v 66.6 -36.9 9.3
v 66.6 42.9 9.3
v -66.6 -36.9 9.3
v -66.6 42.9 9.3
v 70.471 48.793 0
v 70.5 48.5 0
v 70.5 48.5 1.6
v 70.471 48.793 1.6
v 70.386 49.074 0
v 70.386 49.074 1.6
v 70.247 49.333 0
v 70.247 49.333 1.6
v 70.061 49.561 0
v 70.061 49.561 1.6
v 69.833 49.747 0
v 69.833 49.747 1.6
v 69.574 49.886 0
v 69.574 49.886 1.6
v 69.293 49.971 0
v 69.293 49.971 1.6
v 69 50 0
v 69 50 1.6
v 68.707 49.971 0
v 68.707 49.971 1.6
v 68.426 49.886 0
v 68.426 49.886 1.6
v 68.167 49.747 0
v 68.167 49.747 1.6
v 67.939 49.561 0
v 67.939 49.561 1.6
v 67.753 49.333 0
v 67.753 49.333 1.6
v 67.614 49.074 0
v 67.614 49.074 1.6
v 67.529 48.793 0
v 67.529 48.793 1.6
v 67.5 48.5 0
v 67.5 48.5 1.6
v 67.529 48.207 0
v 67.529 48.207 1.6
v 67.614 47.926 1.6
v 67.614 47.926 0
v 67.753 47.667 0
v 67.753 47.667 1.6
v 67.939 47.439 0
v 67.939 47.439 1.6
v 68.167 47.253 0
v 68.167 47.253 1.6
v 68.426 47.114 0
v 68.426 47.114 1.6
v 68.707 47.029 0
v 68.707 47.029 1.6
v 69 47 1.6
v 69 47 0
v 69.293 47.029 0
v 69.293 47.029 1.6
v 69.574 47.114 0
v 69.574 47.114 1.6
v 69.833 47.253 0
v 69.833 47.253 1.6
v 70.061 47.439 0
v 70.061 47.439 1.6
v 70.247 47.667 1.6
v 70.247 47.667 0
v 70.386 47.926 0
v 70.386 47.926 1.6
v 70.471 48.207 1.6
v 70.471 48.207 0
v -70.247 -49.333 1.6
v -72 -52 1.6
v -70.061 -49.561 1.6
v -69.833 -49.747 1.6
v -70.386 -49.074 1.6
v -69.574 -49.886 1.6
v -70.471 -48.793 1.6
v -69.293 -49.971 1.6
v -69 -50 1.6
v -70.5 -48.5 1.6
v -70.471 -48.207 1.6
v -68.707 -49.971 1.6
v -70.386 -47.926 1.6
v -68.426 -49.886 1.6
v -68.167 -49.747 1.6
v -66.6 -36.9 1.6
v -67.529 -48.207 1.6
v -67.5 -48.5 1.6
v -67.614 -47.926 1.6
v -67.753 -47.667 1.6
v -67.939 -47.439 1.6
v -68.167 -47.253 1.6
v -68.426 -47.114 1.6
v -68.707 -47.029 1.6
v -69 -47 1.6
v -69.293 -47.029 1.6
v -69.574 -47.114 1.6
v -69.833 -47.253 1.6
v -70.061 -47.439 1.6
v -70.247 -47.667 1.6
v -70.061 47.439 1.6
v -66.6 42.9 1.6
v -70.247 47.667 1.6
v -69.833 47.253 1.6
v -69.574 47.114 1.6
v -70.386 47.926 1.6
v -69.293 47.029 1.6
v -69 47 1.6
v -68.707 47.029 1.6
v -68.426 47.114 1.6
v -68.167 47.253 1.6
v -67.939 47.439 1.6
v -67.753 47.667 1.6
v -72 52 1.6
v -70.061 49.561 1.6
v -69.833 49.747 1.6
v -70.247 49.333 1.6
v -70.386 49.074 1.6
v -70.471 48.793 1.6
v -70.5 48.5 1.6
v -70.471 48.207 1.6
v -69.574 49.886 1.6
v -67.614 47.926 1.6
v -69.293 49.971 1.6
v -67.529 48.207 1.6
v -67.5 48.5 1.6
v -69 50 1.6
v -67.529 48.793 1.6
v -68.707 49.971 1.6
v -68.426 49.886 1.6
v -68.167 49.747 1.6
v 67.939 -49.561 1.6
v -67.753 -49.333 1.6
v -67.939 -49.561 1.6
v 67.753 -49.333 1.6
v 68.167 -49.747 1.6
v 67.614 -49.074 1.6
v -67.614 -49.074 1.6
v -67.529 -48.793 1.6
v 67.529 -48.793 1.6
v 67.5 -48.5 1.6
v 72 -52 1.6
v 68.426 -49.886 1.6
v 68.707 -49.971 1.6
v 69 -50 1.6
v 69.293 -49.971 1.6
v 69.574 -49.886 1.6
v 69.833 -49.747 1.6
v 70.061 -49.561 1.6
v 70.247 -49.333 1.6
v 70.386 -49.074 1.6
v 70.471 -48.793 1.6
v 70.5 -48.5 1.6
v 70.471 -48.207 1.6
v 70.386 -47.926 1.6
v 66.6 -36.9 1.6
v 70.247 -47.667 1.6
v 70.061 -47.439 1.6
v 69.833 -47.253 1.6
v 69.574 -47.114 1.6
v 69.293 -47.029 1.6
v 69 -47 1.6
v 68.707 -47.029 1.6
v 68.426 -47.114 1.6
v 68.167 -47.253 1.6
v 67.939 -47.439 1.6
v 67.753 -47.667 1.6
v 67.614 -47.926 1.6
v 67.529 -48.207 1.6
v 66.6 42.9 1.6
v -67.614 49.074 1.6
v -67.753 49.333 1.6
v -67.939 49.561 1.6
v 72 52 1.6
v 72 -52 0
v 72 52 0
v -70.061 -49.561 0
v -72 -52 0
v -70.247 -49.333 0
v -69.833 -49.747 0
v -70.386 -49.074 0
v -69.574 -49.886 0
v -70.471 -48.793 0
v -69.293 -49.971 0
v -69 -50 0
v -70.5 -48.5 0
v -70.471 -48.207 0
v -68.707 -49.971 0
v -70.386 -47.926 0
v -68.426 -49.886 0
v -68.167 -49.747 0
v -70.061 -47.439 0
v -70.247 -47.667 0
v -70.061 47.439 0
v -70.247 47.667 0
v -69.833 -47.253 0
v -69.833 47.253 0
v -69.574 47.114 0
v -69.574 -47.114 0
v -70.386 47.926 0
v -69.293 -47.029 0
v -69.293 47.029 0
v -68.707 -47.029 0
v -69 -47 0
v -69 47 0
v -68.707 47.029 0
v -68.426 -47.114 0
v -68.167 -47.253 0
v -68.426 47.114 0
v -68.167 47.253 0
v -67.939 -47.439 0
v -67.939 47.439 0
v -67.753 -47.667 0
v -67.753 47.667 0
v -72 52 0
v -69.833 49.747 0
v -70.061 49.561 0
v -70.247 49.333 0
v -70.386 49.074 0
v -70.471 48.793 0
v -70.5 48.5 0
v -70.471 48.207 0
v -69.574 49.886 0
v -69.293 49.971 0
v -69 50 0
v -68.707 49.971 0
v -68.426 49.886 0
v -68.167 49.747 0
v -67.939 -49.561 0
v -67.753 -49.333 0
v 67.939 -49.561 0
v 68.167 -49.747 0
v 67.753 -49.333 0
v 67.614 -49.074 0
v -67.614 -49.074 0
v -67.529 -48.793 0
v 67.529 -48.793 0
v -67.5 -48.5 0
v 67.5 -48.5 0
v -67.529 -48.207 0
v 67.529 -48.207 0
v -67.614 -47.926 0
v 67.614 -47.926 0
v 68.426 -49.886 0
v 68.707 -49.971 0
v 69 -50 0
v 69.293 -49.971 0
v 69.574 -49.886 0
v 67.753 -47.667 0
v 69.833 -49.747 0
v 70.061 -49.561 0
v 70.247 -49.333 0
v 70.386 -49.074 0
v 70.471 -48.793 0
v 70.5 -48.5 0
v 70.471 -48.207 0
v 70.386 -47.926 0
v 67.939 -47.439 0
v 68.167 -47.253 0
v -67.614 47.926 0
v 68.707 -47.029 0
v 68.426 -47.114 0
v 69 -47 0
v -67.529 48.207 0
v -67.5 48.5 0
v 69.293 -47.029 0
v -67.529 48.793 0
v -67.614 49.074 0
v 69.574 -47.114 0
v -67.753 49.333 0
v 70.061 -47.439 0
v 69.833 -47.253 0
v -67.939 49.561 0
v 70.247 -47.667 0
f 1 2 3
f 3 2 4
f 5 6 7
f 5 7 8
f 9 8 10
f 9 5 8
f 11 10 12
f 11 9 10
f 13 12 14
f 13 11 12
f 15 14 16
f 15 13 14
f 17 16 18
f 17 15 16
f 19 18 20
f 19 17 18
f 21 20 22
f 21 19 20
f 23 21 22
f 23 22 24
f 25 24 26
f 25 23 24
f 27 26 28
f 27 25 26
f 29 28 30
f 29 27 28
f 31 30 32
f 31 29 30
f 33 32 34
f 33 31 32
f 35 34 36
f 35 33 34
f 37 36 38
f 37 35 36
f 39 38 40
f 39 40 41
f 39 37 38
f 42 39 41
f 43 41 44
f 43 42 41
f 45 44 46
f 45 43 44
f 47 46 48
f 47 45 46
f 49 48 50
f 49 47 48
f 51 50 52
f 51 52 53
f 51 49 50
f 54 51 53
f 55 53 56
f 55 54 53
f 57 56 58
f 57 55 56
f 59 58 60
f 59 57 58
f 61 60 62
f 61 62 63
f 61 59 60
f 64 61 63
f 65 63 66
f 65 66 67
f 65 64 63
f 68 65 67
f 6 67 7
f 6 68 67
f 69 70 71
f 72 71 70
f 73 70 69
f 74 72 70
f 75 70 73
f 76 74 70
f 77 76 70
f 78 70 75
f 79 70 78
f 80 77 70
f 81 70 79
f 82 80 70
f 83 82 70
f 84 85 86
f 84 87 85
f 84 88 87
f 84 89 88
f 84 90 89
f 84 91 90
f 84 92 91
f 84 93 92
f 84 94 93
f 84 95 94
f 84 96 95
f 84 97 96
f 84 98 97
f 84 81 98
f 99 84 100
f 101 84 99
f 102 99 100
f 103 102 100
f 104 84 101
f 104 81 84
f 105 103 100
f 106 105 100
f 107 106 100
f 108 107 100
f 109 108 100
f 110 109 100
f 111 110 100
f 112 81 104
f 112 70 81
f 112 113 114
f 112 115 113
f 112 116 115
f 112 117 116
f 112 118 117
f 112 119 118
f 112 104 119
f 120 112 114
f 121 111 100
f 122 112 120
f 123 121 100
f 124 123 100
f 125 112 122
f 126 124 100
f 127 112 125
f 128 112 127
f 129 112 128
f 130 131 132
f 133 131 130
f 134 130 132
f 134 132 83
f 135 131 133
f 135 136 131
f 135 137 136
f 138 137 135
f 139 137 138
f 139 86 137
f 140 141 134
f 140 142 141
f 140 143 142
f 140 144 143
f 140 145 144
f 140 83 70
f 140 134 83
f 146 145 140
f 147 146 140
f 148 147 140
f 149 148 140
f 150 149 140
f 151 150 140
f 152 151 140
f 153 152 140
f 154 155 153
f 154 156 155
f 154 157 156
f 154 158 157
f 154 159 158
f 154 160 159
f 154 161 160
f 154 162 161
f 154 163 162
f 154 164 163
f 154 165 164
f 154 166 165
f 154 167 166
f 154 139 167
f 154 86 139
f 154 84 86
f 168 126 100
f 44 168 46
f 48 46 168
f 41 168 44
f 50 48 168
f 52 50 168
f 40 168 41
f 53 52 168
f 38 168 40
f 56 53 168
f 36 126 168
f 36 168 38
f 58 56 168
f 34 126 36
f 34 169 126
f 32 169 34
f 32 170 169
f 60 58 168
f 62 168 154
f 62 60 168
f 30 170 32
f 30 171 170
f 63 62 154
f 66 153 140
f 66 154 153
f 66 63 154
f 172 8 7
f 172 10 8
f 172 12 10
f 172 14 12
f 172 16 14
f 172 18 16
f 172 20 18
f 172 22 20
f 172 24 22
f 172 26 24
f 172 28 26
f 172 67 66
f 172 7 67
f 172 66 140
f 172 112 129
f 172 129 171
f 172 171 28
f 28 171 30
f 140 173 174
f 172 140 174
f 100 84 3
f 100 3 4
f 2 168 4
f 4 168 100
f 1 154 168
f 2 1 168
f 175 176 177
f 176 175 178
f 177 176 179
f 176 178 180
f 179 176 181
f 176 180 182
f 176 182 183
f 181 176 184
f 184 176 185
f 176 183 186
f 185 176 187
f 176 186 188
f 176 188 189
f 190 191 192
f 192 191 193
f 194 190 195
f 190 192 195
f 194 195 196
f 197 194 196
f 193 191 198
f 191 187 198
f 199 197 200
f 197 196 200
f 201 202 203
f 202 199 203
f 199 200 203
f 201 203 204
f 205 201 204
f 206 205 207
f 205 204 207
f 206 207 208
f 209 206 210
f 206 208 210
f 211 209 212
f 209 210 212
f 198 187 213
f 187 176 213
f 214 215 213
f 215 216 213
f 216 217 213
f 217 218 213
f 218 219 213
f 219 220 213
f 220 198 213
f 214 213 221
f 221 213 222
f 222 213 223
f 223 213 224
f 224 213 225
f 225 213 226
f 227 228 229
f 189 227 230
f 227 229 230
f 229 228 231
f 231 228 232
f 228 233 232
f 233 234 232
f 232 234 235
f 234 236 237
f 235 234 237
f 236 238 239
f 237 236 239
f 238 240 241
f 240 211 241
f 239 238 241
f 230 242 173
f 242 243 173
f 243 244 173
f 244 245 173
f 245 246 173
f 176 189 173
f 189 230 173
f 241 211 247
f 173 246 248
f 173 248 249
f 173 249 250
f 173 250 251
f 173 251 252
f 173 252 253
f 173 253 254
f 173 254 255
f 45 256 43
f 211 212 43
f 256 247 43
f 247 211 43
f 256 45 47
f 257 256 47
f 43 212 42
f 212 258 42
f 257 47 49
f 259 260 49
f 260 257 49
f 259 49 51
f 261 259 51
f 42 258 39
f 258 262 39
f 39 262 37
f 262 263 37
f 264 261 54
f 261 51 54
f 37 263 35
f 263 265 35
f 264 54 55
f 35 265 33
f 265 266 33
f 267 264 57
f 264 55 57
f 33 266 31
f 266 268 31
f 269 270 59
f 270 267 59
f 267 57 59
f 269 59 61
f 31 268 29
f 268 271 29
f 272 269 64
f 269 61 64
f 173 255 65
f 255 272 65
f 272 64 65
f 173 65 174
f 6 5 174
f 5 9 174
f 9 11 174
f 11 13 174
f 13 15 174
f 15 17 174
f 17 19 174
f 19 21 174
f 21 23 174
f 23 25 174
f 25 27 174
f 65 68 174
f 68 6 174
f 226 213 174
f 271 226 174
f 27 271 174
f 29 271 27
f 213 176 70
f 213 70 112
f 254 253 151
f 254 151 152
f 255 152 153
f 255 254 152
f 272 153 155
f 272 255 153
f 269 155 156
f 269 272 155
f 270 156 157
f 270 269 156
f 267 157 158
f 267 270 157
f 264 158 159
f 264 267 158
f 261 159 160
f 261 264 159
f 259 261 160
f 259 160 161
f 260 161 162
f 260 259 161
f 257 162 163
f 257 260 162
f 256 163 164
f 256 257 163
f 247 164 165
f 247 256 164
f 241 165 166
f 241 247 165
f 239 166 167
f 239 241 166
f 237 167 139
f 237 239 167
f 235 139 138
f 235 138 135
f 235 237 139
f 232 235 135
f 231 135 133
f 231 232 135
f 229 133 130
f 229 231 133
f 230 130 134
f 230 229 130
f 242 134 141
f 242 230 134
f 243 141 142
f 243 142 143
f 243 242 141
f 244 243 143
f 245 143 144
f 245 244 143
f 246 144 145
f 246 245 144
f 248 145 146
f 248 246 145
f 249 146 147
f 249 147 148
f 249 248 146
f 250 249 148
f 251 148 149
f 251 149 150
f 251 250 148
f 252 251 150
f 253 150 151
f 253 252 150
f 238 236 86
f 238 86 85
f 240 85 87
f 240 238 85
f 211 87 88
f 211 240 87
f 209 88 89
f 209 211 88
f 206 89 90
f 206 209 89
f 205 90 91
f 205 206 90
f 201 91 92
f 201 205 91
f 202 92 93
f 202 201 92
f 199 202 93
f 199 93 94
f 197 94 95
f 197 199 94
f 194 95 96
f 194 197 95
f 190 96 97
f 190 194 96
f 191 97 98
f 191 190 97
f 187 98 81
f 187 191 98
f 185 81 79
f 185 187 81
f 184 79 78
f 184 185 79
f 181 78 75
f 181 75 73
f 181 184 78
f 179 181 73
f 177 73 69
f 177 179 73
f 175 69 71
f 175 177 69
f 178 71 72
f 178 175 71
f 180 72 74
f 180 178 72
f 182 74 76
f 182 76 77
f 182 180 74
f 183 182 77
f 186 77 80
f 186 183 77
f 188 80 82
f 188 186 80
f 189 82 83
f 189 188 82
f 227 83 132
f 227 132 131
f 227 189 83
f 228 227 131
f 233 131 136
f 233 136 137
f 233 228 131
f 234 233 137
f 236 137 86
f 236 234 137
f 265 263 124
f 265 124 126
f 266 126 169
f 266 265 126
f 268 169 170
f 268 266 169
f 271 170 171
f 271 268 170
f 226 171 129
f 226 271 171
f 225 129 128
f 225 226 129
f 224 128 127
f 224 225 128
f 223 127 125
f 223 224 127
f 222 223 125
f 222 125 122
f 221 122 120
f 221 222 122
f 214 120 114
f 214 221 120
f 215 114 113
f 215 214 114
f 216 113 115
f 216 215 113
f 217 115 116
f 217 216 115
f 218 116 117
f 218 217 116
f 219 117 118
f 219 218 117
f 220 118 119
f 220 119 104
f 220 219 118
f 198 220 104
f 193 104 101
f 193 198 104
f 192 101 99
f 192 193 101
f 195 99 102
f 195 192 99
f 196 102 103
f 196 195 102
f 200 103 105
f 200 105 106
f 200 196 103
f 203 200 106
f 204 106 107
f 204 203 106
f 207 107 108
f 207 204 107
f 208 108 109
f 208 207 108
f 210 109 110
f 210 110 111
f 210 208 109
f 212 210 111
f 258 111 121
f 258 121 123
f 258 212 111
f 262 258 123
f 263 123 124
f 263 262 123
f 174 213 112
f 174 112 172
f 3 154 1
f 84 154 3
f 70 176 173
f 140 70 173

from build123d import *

# Parameters (mm, degrees)
SKETCH_1_W      = 144
SKETCH_1_H      = 104
SKETCH_1_R      = 1.5
SKETCH_1_W_2    = 133.2
SKETCH_1_H_2    = 79.8
EXTRUDE_1_DEPTH = 1.6
SKETCH_2_W      = 133.2
SKETCH_2_H      = 79.8
EXTRUDE_2_DEPTH = 9.3


with BuildPart() as part:
    # 草图1 → 拉伸1 (new body)
    with BuildSketch(Plane.XY):
        Rectangle(SKETCH_1_W, SKETCH_1_H)
        with Locations((-69, -48.5)):
            Circle(SKETCH_1_R, mode=Mode.SUBTRACT)
        with Locations((-69, 48.5)):
            Circle(SKETCH_1_R, mode=Mode.SUBTRACT)
        with Locations((69, 48.5)):
            Circle(SKETCH_1_R, mode=Mode.SUBTRACT)
        with Locations((69, -48.5)):
            Circle(SKETCH_1_R, mode=Mode.SUBTRACT)
        with Locations((0, 3)):
            Rectangle(SKETCH_1_W_2, SKETCH_1_H_2, mode=Mode.SUBTRACT)
    extrude(amount=EXTRUDE_1_DEPTH)

    # 草图2 → 拉伸2 (add)
    with BuildSketch(Plane(origin=(0, 0, 0), x_dir=(-1, 0, 0), z_dir=(0, 0, -1))):
        with Locations((0, 3)):
            Rectangle(SKETCH_2_W, SKETCH_2_H)
    extrude(amount=-EXTRUDE_2_DEPTH)


solid = part.part
